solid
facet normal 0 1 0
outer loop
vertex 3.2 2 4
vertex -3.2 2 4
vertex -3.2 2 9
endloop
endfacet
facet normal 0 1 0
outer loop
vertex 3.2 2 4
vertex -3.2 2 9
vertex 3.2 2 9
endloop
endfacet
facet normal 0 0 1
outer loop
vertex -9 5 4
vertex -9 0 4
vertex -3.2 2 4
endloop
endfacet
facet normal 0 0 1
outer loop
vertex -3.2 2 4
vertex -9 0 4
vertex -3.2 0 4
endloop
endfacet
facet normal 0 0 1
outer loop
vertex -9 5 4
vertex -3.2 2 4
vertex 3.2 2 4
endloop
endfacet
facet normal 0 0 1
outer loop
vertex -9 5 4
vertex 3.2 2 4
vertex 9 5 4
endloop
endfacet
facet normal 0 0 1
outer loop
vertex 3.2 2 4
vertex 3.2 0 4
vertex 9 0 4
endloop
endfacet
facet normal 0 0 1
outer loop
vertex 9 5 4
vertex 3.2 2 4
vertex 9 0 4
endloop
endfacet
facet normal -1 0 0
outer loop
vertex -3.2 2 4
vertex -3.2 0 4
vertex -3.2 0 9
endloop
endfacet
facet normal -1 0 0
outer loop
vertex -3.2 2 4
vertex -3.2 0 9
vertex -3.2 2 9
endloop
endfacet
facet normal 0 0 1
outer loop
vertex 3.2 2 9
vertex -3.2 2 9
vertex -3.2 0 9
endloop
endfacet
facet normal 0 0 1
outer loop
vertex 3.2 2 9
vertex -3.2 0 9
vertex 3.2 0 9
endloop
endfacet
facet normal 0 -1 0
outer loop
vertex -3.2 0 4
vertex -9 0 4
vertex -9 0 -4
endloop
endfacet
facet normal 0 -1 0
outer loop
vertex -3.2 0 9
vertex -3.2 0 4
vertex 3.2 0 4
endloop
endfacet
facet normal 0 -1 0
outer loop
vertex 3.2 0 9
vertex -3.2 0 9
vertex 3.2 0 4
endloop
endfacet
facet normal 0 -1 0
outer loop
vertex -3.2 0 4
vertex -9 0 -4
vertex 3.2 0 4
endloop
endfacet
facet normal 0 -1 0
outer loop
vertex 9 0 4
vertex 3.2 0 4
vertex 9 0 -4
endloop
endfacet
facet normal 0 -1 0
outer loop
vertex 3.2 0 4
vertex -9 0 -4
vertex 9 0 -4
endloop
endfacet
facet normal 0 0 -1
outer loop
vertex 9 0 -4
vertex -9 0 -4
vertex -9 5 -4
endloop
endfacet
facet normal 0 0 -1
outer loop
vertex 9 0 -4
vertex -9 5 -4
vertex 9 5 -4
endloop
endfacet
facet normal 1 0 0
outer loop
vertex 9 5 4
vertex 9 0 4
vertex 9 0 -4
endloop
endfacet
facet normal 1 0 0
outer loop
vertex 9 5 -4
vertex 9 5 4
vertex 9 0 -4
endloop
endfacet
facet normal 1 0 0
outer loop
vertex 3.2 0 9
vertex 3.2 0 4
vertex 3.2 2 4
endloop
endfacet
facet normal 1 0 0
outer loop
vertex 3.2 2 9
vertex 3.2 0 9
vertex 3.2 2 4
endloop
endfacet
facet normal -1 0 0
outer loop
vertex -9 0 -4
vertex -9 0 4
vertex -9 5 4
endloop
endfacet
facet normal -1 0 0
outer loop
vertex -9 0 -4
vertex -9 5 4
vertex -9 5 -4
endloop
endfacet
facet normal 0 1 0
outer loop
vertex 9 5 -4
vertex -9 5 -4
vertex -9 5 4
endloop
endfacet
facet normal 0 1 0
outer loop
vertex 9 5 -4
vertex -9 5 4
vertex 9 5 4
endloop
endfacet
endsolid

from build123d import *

# Parameters (mm, degrees)
ESQUISSE1_W        = 18
ESQUISSE1_H        = 8
BOSS_EXTRU_1_DEPTH = 5
ESQUISSE2_W        = 6.4
ESQUISSE2_H        = 2
BOSS_EXTRU_2_DEPTH = 5


with BuildPart() as part:
    # Esquisse1 → Boss.-Extru.1 (new body)
    with BuildSketch(Plane(origin=(0, 0, 0), x_dir=(1, 0, 0), z_dir=(0, 1, 0))):
        Rectangle(ESQUISSE1_W, ESQUISSE1_H)
    extrude(amount=BOSS_EXTRU_1_DEPTH)

    # Esquisse2 → Boss.-Extru.2 (add)
    with BuildSketch(Plane.XY.offset(4)):
        with Locations((0, 1)):
            Rectangle(ESQUISSE2_W, ESQUISSE2_H)
    extrude(amount=BOSS_EXTRU_2_DEPTH)


solid = part.part
